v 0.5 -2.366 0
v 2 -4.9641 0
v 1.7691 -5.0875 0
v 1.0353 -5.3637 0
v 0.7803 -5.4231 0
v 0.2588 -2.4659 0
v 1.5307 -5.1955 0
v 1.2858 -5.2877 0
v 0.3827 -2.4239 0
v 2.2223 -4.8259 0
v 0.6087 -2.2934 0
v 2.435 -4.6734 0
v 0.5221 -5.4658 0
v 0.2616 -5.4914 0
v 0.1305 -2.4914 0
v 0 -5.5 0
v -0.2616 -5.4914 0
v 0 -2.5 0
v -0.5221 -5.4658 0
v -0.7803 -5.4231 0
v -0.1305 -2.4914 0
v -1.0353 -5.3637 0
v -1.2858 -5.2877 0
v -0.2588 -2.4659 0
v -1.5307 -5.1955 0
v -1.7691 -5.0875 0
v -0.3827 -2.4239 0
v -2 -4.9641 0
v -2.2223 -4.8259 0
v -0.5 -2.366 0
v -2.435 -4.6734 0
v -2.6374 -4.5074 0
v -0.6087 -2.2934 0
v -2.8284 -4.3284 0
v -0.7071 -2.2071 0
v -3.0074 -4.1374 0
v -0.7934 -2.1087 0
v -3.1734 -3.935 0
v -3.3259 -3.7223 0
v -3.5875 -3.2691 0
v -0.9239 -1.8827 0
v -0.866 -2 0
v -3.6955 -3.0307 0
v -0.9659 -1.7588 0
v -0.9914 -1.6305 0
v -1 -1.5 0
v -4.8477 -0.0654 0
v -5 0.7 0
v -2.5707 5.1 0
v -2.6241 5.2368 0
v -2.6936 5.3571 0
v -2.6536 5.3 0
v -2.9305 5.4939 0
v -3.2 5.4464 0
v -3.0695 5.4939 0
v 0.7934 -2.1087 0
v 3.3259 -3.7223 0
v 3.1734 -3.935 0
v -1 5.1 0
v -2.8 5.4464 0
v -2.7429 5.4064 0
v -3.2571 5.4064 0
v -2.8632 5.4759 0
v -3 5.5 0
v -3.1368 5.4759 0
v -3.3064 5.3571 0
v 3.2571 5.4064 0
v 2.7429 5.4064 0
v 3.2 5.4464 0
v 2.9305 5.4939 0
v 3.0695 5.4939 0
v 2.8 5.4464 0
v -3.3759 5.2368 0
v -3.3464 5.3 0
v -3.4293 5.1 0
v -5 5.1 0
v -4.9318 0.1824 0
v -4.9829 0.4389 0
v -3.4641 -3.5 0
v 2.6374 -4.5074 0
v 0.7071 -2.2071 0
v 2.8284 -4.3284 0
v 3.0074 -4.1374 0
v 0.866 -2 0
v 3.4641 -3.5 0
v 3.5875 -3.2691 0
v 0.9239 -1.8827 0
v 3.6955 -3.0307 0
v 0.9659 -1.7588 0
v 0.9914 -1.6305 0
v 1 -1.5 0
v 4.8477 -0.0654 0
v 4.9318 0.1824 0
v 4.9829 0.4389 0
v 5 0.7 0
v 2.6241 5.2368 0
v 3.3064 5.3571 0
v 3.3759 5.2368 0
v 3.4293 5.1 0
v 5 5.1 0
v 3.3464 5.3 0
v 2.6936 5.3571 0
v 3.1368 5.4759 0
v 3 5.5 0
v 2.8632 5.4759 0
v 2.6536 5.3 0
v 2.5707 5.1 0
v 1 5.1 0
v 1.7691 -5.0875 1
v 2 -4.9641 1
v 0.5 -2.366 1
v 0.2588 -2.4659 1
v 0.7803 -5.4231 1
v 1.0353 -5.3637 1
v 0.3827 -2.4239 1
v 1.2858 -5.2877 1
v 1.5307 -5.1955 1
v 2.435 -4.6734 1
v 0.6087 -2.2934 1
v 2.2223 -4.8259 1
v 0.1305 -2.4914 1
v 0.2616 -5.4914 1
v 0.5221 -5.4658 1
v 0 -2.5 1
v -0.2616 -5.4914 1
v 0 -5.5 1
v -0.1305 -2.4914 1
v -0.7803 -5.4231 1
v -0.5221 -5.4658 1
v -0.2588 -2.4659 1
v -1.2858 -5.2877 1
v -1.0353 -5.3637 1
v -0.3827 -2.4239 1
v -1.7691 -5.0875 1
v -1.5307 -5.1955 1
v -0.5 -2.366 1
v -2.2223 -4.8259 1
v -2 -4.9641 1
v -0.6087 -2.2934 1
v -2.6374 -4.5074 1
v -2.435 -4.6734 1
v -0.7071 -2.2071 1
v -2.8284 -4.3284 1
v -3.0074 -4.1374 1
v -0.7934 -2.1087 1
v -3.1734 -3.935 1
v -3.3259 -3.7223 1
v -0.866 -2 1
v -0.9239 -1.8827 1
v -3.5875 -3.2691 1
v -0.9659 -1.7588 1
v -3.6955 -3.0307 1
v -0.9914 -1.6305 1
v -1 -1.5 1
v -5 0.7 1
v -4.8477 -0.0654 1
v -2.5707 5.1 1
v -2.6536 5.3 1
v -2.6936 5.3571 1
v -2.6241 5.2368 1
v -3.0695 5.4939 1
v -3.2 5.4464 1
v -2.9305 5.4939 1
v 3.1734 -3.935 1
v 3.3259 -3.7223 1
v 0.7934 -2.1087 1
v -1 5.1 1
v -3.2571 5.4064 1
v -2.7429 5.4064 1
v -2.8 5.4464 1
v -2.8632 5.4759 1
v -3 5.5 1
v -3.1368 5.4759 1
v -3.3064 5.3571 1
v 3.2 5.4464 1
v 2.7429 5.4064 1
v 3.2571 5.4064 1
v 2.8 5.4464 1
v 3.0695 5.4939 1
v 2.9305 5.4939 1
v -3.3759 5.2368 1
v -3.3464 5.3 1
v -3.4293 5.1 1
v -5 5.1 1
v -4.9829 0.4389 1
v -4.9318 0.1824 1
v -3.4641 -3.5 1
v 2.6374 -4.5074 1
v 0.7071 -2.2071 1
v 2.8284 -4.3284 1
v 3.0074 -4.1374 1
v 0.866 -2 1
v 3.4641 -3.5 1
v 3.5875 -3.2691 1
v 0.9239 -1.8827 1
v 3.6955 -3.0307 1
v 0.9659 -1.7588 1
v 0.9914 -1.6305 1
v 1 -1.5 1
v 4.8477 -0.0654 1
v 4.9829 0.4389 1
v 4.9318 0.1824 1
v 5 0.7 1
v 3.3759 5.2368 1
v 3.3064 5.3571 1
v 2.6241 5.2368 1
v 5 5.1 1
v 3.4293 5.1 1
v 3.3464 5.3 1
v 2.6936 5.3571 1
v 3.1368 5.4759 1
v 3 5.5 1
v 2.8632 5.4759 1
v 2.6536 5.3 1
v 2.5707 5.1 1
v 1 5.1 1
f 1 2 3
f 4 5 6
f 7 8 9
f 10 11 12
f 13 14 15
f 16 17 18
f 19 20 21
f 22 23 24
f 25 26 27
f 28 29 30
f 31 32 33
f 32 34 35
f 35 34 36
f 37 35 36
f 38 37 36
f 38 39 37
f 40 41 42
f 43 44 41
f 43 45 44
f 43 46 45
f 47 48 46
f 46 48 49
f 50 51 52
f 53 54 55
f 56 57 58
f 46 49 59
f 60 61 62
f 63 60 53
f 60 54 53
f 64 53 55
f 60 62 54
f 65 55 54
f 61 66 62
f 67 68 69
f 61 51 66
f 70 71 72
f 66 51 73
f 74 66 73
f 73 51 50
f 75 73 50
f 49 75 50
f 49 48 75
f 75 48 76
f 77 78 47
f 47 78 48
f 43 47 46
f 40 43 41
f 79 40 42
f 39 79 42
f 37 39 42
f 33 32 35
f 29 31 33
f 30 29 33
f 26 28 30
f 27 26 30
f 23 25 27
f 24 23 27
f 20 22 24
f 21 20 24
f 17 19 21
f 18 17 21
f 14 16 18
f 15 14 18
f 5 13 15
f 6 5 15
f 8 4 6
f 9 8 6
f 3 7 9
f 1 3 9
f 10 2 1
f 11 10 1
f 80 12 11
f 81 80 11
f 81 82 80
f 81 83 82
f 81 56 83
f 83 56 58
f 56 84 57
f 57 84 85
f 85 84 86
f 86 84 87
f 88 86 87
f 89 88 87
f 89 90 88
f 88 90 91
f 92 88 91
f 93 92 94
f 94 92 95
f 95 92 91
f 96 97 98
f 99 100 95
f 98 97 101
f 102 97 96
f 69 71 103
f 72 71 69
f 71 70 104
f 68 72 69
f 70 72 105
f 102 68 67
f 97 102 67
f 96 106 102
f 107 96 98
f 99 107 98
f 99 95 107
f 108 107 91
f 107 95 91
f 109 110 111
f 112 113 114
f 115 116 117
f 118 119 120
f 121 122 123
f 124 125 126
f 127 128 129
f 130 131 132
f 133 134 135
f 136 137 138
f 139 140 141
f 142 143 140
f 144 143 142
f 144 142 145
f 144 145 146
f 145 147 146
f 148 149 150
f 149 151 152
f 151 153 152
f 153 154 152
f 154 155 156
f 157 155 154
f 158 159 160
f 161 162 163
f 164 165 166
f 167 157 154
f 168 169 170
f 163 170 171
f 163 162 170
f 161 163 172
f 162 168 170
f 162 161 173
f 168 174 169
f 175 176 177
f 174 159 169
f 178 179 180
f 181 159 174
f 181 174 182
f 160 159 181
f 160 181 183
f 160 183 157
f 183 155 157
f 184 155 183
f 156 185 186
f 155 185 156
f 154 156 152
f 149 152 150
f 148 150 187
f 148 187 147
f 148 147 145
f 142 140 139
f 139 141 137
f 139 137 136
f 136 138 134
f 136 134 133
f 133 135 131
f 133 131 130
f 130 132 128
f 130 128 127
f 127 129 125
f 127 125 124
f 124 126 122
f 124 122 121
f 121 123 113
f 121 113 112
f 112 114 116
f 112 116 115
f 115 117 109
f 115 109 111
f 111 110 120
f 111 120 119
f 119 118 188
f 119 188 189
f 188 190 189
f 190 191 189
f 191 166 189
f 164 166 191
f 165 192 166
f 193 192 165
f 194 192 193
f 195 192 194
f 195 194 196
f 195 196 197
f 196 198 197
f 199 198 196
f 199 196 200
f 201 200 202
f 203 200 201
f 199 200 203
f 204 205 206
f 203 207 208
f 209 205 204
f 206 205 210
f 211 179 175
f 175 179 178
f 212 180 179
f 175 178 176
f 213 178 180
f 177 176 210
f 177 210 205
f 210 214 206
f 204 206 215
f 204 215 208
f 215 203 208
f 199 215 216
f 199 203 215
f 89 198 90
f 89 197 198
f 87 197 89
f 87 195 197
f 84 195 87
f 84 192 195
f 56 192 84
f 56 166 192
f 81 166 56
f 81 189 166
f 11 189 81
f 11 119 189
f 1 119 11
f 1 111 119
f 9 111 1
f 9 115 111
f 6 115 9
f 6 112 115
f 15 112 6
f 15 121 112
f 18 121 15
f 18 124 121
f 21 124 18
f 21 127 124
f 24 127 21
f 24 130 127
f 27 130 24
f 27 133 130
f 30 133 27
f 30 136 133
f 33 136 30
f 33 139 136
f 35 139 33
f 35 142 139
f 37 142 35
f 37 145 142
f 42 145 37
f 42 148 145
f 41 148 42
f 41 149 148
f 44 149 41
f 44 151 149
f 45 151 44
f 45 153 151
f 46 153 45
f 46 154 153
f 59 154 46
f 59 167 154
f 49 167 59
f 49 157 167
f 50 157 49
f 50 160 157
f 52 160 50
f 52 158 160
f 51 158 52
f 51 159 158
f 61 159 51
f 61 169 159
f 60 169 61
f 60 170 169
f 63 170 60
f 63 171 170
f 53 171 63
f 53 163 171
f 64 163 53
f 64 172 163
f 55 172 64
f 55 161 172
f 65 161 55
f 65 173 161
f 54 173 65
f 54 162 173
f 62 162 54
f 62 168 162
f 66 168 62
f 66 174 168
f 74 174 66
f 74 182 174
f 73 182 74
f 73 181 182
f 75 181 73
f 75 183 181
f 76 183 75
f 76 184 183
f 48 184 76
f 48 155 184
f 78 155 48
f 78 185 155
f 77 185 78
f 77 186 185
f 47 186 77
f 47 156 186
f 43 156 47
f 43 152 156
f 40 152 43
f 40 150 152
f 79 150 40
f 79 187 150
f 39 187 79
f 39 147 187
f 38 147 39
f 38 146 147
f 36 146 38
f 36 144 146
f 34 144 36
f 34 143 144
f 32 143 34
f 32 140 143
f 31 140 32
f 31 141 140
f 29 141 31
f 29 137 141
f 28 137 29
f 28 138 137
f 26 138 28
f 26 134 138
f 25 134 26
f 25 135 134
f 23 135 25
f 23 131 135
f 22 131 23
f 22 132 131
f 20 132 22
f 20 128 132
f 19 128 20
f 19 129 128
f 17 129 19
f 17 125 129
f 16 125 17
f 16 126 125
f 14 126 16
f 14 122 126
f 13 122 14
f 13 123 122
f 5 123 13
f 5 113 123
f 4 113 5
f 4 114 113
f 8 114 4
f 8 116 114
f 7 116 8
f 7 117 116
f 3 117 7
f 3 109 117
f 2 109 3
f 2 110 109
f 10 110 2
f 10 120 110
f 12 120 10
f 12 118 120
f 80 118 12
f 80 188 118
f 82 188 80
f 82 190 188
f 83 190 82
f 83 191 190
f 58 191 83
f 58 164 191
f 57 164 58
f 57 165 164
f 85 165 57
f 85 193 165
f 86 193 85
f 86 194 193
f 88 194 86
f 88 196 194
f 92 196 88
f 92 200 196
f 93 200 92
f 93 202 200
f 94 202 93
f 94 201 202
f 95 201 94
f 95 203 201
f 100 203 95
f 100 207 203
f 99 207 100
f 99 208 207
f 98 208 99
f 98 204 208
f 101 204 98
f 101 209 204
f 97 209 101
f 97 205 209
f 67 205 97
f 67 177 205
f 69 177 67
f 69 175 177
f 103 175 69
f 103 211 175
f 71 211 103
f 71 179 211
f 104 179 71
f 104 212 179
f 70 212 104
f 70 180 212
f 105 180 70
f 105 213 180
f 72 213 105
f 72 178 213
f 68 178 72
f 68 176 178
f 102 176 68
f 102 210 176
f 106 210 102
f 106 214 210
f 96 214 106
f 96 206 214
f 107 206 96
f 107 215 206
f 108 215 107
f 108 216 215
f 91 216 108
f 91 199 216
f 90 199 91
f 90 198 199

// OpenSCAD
// file: cpf_fork_common.scad
// Shared scaffold helpers for DRW-005 Sheet 3 fork parts.
// Keeps cp-f1 through cp-f6 dimension-driven and easy to tune from the drawing.
// SPDX-License-Identifier: MIT

module cpf_fork_profile_2d(
    body_r,
    slot_w,
    slot_l,
    overall_w,
    overall_l,
    shoulder_r,
    tip_r,
    center = true
) {
    stem_x = slot_w / 2 + (overall_w - slot_w) / 2;
    stem_w = overall_w - slot_w;
    top_y = overall_l - tip_r;
    shoulder_y = max(body_r * 0.55, overall_l - slot_l - shoulder_r);
    slot_floor_y = max(0, overall_l - slot_l - slot_w / 2);
    y_center = (overall_l - body_r) / 2;

    translate([0, center ? -y_center : 0])
    difference() {
        union() {
            circle(r = body_r, $fn = 96);

            hull() {
                circle(r = body_r, $fn = 96);
                for (side = [-1, 1]) {
                    translate([side * (slot_w / 2 + shoulder_r), shoulder_y])
                        circle(r = shoulder_r, $fn = 48);
                }
            }

            for (side = [-1, 1]) {
                hull() {
                    translate([side * (slot_w / 2 + shoulder_r), shoulder_y])
                        circle(r = shoulder_r, $fn = 48);
                    translate([side * stem_x, top_y])
                        circle(r = tip_r, $fn = 36);
                }

                translate([side * stem_x - stem_w / 2, shoulder_y])
                    square([stem_w, max(0.01, top_y - shoulder_y)], center = false);
            }
        }

        union() {
            hull() {
                translate([0, slot_floor_y]) circle(r = slot_w / 2, $fn = 48);
                translate([0, overall_l - slot_w / 2])
                    circle(r = slot_w / 2, $fn = 48);
            }

            translate([-slot_w / 2, slot_floor_y])
                square([slot_w, max(0.01, overall_l - slot_w / 2 - slot_floor_y)], center = false);
        }
    }
}

module cpf_fork_part(
    body_r,
    slot_w,
    slot_l,
    overall_w,
    overall_l,
    shoulder_r,
    tip_r,
    thickness = 1.0,
    center = true
) {
    linear_extrude(height = thickness)
        cpf_fork_profile_2d(
            body_r = body_r,
            slot_w = slot_w,
            slot_l = slot_l,
            overall_w = overall_w,
            overall_l = overall_l,
            shoulder_r = shoulder_r,
            tip_r = tip_r,
            center = center
        );
}
// main file
// part_id: cp-f3
// name: Fork 2W 4D 8L 7T
// source_drawing_ids: DRW-005
// units: mm
// revision: 0.1
// SPDX-License-Identifier: MIT

use <cpf_fork_common.scad>

module part_cpf3(th = 1.0) {
    cpf_fork_part(
        body_r = 4.0,
        slot_w = 2.0,
        slot_l = 8.0,
        overall_w = 6.0,
        overall_l = 7.0,
        shoulder_r = 2.0,
        tip_r = 0.4,
        thickness = th
    );
}

// ---- "main guard" ----
// Default to previewing when opened directly:
if (is_undef(__LIB_MODE__)) {
    part_cpf3();
}
